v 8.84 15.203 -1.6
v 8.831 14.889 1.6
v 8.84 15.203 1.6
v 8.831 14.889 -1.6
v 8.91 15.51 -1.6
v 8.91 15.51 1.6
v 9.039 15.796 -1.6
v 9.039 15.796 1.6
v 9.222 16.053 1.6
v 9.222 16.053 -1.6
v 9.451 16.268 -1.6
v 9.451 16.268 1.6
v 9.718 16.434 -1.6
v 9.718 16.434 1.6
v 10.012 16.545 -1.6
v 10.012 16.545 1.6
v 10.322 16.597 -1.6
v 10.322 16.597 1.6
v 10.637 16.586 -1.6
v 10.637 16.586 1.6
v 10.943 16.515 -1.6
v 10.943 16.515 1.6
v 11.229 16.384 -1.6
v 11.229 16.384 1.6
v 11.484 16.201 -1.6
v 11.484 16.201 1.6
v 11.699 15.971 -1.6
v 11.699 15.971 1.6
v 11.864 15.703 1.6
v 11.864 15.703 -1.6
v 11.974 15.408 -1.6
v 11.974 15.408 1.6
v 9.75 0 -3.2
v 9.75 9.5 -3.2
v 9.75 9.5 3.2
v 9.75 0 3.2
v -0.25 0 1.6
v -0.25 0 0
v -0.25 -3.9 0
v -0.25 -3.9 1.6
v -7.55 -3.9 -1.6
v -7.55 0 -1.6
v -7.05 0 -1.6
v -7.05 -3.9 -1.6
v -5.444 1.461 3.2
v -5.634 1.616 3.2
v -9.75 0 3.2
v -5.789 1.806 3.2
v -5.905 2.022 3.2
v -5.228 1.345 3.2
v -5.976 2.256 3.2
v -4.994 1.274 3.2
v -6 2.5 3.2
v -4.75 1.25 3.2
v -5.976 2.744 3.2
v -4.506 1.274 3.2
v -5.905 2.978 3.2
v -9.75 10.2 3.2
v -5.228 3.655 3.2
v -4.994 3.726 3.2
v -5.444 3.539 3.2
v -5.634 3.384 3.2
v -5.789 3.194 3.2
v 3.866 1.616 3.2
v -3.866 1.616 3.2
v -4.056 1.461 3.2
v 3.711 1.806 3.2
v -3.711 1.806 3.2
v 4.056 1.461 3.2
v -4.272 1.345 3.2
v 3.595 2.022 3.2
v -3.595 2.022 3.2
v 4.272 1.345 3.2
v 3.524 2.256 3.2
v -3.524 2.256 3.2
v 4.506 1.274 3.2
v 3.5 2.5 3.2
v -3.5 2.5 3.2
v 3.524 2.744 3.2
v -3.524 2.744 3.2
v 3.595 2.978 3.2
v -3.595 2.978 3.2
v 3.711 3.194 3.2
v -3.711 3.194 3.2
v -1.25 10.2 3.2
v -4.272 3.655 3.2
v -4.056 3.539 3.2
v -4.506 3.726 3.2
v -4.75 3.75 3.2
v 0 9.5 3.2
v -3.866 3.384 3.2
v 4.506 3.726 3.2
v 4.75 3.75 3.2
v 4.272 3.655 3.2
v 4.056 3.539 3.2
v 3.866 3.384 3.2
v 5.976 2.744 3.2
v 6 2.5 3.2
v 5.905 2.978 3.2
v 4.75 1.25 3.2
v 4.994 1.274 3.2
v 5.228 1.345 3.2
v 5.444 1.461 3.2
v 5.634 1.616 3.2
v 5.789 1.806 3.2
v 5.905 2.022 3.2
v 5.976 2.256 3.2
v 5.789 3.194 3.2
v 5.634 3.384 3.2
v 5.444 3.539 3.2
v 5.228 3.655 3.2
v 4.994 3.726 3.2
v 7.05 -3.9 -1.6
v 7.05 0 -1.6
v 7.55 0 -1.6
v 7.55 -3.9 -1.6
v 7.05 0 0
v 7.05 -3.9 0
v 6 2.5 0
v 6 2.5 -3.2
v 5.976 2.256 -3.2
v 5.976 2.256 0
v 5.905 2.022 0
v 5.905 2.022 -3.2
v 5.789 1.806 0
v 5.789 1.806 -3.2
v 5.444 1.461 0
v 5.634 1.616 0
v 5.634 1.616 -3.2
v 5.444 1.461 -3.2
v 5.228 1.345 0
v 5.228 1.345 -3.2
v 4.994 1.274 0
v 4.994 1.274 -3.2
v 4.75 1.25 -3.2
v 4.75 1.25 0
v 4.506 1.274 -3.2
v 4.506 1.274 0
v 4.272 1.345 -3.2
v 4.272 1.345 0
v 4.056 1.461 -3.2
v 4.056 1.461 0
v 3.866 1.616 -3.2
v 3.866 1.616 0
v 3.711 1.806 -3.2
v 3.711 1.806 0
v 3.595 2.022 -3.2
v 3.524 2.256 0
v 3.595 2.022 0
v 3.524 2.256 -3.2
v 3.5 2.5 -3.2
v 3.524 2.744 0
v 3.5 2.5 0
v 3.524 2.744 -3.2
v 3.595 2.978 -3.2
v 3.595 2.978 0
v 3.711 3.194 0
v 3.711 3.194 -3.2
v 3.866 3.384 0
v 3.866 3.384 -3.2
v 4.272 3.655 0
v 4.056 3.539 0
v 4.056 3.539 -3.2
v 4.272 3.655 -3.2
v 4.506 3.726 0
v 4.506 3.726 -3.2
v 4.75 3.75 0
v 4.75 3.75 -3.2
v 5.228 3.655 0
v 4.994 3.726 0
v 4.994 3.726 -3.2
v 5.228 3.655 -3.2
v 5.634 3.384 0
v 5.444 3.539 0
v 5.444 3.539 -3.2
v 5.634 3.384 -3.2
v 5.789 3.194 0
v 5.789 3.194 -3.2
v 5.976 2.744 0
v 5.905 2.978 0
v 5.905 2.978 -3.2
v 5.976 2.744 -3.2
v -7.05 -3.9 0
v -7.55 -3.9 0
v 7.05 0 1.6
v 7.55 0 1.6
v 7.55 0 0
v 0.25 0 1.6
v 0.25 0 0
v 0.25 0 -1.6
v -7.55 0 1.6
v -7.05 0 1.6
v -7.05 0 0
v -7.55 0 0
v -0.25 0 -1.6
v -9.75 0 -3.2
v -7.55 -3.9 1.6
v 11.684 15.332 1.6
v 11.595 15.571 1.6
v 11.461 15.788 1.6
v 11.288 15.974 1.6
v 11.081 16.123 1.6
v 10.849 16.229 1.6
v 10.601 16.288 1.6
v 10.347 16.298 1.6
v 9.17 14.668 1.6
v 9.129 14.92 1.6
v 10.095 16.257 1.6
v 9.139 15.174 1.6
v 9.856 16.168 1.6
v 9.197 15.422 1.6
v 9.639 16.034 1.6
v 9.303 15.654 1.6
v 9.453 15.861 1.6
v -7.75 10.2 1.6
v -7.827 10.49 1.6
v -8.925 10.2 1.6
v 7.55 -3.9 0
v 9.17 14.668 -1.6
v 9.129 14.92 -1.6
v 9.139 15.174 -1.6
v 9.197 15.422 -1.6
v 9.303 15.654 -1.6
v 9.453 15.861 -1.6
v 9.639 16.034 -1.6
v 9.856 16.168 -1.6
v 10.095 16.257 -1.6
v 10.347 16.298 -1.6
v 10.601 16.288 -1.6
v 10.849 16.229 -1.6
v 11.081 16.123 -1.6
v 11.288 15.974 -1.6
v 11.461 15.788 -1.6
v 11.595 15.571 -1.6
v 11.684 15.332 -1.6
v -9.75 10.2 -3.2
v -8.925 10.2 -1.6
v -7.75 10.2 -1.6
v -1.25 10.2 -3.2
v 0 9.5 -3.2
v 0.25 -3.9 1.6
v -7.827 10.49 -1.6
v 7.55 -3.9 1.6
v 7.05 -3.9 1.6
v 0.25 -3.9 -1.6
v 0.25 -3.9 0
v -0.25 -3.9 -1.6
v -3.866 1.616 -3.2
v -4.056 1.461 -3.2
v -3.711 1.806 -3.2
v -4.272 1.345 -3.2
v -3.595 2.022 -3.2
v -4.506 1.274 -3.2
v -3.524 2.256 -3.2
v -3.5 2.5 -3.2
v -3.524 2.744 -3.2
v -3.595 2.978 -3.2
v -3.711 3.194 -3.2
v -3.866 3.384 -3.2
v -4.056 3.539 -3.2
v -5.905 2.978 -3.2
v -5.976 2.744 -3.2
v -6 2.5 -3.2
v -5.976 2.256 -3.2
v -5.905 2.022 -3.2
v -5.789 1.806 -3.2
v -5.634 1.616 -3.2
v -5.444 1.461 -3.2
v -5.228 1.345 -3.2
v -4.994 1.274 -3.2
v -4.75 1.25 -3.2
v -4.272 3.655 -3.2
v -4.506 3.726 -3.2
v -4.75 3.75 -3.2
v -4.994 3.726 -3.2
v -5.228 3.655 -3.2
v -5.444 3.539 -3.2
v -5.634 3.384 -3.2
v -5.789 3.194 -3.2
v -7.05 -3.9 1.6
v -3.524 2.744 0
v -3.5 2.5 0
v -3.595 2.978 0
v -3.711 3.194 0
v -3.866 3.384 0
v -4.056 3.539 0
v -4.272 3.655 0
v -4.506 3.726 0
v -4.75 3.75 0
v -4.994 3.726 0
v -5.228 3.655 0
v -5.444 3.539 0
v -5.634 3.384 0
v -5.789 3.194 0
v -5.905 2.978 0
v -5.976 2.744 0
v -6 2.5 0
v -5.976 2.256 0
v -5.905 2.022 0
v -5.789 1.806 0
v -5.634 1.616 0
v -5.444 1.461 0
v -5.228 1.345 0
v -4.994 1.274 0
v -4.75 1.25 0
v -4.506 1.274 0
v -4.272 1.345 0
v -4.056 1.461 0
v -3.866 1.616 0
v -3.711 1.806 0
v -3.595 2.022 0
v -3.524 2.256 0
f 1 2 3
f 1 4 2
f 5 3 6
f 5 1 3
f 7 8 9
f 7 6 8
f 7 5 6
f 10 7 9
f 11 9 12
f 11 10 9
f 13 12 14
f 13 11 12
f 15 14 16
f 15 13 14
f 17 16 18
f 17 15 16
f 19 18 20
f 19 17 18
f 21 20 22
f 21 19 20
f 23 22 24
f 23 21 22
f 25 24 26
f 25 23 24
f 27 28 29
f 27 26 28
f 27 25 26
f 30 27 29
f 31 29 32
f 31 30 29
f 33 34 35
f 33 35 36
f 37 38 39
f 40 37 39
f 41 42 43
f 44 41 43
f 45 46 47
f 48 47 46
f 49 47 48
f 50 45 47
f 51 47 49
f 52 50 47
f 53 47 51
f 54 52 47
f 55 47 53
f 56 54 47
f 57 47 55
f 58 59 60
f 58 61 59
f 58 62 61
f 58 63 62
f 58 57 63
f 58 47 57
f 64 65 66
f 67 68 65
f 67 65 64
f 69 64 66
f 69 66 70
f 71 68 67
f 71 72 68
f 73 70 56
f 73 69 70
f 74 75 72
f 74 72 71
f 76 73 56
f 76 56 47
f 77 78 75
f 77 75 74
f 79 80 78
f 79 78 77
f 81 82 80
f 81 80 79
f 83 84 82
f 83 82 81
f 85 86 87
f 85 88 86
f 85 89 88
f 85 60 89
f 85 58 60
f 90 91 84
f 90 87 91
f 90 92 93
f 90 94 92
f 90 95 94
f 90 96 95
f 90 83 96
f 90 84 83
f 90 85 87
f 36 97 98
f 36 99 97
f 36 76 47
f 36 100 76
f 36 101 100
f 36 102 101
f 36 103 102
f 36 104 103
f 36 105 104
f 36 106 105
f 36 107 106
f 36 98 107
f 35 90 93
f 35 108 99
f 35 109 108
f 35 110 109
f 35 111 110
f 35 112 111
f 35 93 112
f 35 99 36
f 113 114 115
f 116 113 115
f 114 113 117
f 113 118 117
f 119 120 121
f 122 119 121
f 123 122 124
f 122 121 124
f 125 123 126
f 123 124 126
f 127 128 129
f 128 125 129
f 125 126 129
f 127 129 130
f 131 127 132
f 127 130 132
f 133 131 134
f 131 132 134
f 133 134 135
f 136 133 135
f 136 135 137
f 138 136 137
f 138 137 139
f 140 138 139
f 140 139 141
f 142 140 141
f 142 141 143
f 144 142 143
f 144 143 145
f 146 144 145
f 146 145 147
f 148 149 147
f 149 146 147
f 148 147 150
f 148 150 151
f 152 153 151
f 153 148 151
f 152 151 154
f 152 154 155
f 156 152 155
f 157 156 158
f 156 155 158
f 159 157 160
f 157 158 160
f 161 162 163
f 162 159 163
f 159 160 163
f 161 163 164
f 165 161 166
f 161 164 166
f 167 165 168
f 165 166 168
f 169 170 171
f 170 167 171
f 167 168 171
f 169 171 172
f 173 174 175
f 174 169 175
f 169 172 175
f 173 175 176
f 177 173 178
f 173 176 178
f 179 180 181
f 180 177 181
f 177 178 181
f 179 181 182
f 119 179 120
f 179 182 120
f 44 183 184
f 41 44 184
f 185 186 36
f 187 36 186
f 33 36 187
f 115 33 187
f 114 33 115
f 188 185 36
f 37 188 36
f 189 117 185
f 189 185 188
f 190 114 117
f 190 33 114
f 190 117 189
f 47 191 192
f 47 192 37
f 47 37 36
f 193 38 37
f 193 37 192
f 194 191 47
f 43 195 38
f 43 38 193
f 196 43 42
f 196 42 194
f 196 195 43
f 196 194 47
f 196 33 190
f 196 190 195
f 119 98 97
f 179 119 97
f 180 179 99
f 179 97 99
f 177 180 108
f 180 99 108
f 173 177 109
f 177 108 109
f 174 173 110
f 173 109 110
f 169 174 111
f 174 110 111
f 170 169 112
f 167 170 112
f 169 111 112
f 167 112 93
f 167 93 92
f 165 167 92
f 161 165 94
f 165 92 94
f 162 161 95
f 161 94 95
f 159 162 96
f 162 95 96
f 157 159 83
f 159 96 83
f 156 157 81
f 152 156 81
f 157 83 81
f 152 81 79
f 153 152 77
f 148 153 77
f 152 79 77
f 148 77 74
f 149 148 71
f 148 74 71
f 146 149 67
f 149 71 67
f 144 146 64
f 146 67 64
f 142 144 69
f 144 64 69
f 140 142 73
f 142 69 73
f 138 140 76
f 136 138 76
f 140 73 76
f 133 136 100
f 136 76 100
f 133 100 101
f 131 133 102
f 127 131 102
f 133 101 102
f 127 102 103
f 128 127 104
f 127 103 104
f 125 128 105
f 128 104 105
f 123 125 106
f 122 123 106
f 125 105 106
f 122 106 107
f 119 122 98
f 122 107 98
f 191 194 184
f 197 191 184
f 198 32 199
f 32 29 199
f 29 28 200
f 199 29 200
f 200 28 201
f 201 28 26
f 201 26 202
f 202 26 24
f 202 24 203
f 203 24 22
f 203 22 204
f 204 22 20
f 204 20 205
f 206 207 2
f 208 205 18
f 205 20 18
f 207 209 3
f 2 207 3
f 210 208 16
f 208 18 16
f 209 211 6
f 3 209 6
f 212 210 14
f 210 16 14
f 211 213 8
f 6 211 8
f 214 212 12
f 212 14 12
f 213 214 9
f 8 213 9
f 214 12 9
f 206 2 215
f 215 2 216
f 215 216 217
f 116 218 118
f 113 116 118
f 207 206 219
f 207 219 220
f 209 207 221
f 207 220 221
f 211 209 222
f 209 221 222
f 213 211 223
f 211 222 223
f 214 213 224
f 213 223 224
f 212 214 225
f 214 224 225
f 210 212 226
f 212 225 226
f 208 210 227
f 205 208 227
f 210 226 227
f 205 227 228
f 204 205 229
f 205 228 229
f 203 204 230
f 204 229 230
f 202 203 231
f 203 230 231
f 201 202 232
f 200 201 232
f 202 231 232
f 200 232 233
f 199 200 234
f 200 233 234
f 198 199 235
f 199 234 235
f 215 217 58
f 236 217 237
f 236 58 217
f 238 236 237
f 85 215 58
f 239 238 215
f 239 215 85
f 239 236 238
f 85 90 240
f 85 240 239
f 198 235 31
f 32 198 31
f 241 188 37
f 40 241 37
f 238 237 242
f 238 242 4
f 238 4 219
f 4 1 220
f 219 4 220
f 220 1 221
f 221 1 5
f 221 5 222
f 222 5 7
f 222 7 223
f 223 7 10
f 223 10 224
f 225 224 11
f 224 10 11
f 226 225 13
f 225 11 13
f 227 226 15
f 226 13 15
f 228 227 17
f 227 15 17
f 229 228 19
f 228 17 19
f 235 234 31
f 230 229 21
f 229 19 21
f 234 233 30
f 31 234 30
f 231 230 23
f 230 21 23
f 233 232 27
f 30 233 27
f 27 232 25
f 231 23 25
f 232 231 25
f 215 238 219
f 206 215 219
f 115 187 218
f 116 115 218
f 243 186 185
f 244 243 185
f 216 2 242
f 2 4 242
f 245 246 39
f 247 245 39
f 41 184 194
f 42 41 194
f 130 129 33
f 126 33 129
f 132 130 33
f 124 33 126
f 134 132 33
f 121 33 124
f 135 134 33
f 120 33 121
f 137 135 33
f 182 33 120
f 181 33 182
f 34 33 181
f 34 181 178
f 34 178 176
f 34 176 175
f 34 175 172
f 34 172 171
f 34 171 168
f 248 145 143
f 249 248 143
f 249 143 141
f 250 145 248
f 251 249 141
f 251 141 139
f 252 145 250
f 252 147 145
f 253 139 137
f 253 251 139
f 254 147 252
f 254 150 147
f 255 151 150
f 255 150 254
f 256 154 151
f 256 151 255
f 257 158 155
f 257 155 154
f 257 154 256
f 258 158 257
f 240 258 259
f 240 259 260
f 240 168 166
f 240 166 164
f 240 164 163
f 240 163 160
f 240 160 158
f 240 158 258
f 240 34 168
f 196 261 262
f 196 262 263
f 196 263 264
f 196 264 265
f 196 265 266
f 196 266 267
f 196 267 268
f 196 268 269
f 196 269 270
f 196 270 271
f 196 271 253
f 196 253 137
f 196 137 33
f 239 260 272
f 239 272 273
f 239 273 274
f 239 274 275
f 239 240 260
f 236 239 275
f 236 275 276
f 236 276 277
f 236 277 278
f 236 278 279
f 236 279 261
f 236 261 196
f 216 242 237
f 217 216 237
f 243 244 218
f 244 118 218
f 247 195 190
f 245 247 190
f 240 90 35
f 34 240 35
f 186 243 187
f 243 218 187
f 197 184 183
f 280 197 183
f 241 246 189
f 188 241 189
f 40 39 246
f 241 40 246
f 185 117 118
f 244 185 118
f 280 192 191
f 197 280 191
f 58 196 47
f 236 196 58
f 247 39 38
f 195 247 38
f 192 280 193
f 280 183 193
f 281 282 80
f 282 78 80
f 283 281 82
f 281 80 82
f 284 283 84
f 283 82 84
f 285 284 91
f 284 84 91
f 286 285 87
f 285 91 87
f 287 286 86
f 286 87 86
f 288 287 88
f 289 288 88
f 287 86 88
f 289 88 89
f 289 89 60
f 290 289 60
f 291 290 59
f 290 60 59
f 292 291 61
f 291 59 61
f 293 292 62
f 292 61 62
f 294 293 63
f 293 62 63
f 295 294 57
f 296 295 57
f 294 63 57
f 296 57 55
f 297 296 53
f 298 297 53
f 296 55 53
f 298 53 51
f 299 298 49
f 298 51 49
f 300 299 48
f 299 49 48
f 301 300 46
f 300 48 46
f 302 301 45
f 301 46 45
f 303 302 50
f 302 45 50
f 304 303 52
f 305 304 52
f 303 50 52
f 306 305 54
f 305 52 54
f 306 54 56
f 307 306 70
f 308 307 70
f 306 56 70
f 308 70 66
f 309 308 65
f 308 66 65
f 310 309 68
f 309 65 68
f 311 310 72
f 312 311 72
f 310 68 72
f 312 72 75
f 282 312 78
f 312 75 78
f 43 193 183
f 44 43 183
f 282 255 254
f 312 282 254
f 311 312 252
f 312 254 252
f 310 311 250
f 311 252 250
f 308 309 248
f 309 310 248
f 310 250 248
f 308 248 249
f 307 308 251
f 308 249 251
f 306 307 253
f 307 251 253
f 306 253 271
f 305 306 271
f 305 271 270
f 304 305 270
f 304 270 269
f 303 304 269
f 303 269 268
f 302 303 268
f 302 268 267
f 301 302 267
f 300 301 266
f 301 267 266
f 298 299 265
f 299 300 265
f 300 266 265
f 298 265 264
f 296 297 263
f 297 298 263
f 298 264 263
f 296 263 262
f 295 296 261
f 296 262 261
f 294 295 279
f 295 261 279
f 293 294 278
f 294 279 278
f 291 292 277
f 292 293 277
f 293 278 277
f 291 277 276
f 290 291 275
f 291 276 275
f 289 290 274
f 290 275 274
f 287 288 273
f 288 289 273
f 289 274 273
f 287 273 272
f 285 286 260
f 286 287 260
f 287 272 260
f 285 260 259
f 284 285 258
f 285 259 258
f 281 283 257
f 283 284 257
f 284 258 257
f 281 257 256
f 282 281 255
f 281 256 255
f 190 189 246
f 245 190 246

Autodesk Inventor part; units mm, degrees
ref_plane "YZ Plane" through (0, 0, 0) normal (1, 0, 0) x (0, 1, 0)
ref_plane "XZ Plane" through (0, 0, 0) normal (0, 1, 0) x (-1, 0, 0)
ref_plane "XY Plane" through (0, 0, 0) normal (0, 0, 1) x (1, 0, 0)
sketch "スケッチ1" plane through (0, 0, 0) normal (0, 0, 1) x (1, 0, 0)
  line L0 (-9.75, 10.2) -> (9.75, 10.2)
  line L1 (9.75, 10.2) -> (9.75, 0)
  line L2 (9.75, 0) -> (-9.75, 0)
  line L3 (-9.75, 0) -> (-9.75, 10.2)
  line L4 (-9.75, 10.2) -> (9.75, 0) construction
  line L5 (9.75, 10.2) -> (-9.75, 0) construction
  line L6 (-13.65, 0) -> (13.65, 0) projected
  point P0 (0, 0)
  point P1 (0, 5.1)
  point P2 (0, 0)
  dimension "d0" = 19.5
  dimension "d1" = 10.2
extrude "押し出し1" add sketch "スケッチ1" along normal blind 3.2
sketch "スケッチ2" plane through (0, 0, 3.2) normal (0, 0, 1) x (1, 0, 0)
  line L0 (9.75, 0) -> (9.75, 10.2) projected
  line L1 (9.75, 0) -> (0, 0)
  line L2 (0, 0) -> (0, 9.5)
  line L3 (0, 9.5) -> (9.75, 9.5)
  line L4 (9.75, 9.5) -> (9.75, 0)
  line L5 (-9.75, 0) -> (9.75, 0) projected
  line L6 (0, 9.5) -> (-1.25, 10.2)
  line L7 (9.75, 10.2) -> (-9.75, 10.2) projected
  point P0 (0, 0)
  point P1 (0, 0)
  dimension "d4" = 9.5
  dimension "d5" = 11
extrude "押し出し2" cut sketch "スケッチ2" against normal through all contours L3 L6 L7 L0
sketch "スケッチ3" plane through (0, 0, 3.2) normal (0, 0, 1) x (1, 0, 0)
  circle A0 centre (-4.75, 2.5) radius 1.25
  circle A1 centre (4.75, 2.5) radius 1.25
  line L0 (0, -2.04) -> (0, 12.24) projected
  line L1 (-9.75, 0) -> (9.75, 0) projected
  point P0 (0, 0)
  dimension "d8" = 2.5
  dimension "d9" = 9.5
  dimension "d10" = 2.5
extrude "押し出し3" cut sketch "スケッチ3" against normal through all
sketch "スケッチ5" plane through (0, 0, 0) normal (0, 0, -1) x (-1, 0, 0)
  line L0 (9.75, 0) -> (-9.75, 0) projected
  line L1 (-0.25, 0) -> (0.25, 0)
  line L2 (0.25, 0) -> (0.25, -3.9)
  line L3 (0.25, -3.9) -> (-0.25, -3.9)
  line L4 (-0.25, -3.9) -> (-0.25, 0)
  line L5 (7.05, 0) -> (7.55, 0)
  line L6 (7.55, 0) -> (7.55, -3.9)
  line L7 (7.55, -3.9) -> (7.05, -3.9)
  line L8 (7.05, -3.9) -> (7.05, 0)
  line L9 (-7.55, 0) -> (-7.05, 0)
  line L10 (-7.05, 0) -> (-7.05, -3.9)
  line L11 (-7.05, -3.9) -> (-7.55, -3.9)
  line L12 (-7.55, -3.9) -> (-7.55, 0)
  line L13 (9.75, 0) -> (-9.75, 0) projected
  circle A0 centre (-4.75, 2.5) radius 1.25 projected
  line L14 (-10.4269, 15) -> (-10.3503, 15.2901)
  line L15 (-10.3503, 15.2901) -> (7.8266, 10.4901)
  line L16 (7.8266, 10.4901) -> (7.75, 10.2)
  line L17 (7.75, 10.2) -> (-10.4269, 15)
  line L18 (-11.05, 10.2) -> (7.75, 10.2) construction
  line L19 (1.25, 10.2) -> (9.75, 10.2) projected
  circle A1 centre (4.75, 2.5) radius 1.25 projected
  line L20 (9.75, 10.2) -> (9.75, 0) projected
  arc A2 (-10.4269, 15) -> (-11.05, 10.2) centre (7.75, 10.2) ccw construction
  circle A3 centre (-10.4269, 15) radius 1.3
  circle A4 centre (-10.4269, 15) radius 1.6
  line L21 (-10.4269, 15) -> (-11.9739, 15.4085)
  line L22 (7.8266, 10.4901) -> (8.925, 10.2)
  point P0 (0, 0)
  point P1 (7.3, -3.9)
  point P2 (0, -3.9)
  point P3 (-7.3, -3.9)
  point P4 (0, 0)
  point P5 (-8.8308, 14.8888)
  point P6 (-11.6838, 15.3319)
  point P7 (-9.17, 14.6681)
  dimension "d26" = 3.2
  dimension "d13" = 0.5
  dimension "d14" = 7.3
  dimension "d15" = 7.3
  dimension "d17" = 6.4
  dimension "d21" = 0.3
  dimension "d22" = 15.8
  dimension "d23" = 2
  dimension "d25" = 2.6
  dimension "d27" = 15
extrude "押し出し4" add sketch "スケッチ5" against normal blind 1.6 contours L10 L11 L12 L0 | L2 L3 L4 L0 | L6 L7 L8 L0 | L19 L16 L22 | L17 A4 L15 L16 | L17 A3 L15 A4 | L15 A3 L21 A4
mirror "ミラー1" about plane through (0, 5.1, 0) normal (0, 0, -1)
equation "\"d15\" = d14"
properties part number "limit_switch" material "アルミニウム 6061"
